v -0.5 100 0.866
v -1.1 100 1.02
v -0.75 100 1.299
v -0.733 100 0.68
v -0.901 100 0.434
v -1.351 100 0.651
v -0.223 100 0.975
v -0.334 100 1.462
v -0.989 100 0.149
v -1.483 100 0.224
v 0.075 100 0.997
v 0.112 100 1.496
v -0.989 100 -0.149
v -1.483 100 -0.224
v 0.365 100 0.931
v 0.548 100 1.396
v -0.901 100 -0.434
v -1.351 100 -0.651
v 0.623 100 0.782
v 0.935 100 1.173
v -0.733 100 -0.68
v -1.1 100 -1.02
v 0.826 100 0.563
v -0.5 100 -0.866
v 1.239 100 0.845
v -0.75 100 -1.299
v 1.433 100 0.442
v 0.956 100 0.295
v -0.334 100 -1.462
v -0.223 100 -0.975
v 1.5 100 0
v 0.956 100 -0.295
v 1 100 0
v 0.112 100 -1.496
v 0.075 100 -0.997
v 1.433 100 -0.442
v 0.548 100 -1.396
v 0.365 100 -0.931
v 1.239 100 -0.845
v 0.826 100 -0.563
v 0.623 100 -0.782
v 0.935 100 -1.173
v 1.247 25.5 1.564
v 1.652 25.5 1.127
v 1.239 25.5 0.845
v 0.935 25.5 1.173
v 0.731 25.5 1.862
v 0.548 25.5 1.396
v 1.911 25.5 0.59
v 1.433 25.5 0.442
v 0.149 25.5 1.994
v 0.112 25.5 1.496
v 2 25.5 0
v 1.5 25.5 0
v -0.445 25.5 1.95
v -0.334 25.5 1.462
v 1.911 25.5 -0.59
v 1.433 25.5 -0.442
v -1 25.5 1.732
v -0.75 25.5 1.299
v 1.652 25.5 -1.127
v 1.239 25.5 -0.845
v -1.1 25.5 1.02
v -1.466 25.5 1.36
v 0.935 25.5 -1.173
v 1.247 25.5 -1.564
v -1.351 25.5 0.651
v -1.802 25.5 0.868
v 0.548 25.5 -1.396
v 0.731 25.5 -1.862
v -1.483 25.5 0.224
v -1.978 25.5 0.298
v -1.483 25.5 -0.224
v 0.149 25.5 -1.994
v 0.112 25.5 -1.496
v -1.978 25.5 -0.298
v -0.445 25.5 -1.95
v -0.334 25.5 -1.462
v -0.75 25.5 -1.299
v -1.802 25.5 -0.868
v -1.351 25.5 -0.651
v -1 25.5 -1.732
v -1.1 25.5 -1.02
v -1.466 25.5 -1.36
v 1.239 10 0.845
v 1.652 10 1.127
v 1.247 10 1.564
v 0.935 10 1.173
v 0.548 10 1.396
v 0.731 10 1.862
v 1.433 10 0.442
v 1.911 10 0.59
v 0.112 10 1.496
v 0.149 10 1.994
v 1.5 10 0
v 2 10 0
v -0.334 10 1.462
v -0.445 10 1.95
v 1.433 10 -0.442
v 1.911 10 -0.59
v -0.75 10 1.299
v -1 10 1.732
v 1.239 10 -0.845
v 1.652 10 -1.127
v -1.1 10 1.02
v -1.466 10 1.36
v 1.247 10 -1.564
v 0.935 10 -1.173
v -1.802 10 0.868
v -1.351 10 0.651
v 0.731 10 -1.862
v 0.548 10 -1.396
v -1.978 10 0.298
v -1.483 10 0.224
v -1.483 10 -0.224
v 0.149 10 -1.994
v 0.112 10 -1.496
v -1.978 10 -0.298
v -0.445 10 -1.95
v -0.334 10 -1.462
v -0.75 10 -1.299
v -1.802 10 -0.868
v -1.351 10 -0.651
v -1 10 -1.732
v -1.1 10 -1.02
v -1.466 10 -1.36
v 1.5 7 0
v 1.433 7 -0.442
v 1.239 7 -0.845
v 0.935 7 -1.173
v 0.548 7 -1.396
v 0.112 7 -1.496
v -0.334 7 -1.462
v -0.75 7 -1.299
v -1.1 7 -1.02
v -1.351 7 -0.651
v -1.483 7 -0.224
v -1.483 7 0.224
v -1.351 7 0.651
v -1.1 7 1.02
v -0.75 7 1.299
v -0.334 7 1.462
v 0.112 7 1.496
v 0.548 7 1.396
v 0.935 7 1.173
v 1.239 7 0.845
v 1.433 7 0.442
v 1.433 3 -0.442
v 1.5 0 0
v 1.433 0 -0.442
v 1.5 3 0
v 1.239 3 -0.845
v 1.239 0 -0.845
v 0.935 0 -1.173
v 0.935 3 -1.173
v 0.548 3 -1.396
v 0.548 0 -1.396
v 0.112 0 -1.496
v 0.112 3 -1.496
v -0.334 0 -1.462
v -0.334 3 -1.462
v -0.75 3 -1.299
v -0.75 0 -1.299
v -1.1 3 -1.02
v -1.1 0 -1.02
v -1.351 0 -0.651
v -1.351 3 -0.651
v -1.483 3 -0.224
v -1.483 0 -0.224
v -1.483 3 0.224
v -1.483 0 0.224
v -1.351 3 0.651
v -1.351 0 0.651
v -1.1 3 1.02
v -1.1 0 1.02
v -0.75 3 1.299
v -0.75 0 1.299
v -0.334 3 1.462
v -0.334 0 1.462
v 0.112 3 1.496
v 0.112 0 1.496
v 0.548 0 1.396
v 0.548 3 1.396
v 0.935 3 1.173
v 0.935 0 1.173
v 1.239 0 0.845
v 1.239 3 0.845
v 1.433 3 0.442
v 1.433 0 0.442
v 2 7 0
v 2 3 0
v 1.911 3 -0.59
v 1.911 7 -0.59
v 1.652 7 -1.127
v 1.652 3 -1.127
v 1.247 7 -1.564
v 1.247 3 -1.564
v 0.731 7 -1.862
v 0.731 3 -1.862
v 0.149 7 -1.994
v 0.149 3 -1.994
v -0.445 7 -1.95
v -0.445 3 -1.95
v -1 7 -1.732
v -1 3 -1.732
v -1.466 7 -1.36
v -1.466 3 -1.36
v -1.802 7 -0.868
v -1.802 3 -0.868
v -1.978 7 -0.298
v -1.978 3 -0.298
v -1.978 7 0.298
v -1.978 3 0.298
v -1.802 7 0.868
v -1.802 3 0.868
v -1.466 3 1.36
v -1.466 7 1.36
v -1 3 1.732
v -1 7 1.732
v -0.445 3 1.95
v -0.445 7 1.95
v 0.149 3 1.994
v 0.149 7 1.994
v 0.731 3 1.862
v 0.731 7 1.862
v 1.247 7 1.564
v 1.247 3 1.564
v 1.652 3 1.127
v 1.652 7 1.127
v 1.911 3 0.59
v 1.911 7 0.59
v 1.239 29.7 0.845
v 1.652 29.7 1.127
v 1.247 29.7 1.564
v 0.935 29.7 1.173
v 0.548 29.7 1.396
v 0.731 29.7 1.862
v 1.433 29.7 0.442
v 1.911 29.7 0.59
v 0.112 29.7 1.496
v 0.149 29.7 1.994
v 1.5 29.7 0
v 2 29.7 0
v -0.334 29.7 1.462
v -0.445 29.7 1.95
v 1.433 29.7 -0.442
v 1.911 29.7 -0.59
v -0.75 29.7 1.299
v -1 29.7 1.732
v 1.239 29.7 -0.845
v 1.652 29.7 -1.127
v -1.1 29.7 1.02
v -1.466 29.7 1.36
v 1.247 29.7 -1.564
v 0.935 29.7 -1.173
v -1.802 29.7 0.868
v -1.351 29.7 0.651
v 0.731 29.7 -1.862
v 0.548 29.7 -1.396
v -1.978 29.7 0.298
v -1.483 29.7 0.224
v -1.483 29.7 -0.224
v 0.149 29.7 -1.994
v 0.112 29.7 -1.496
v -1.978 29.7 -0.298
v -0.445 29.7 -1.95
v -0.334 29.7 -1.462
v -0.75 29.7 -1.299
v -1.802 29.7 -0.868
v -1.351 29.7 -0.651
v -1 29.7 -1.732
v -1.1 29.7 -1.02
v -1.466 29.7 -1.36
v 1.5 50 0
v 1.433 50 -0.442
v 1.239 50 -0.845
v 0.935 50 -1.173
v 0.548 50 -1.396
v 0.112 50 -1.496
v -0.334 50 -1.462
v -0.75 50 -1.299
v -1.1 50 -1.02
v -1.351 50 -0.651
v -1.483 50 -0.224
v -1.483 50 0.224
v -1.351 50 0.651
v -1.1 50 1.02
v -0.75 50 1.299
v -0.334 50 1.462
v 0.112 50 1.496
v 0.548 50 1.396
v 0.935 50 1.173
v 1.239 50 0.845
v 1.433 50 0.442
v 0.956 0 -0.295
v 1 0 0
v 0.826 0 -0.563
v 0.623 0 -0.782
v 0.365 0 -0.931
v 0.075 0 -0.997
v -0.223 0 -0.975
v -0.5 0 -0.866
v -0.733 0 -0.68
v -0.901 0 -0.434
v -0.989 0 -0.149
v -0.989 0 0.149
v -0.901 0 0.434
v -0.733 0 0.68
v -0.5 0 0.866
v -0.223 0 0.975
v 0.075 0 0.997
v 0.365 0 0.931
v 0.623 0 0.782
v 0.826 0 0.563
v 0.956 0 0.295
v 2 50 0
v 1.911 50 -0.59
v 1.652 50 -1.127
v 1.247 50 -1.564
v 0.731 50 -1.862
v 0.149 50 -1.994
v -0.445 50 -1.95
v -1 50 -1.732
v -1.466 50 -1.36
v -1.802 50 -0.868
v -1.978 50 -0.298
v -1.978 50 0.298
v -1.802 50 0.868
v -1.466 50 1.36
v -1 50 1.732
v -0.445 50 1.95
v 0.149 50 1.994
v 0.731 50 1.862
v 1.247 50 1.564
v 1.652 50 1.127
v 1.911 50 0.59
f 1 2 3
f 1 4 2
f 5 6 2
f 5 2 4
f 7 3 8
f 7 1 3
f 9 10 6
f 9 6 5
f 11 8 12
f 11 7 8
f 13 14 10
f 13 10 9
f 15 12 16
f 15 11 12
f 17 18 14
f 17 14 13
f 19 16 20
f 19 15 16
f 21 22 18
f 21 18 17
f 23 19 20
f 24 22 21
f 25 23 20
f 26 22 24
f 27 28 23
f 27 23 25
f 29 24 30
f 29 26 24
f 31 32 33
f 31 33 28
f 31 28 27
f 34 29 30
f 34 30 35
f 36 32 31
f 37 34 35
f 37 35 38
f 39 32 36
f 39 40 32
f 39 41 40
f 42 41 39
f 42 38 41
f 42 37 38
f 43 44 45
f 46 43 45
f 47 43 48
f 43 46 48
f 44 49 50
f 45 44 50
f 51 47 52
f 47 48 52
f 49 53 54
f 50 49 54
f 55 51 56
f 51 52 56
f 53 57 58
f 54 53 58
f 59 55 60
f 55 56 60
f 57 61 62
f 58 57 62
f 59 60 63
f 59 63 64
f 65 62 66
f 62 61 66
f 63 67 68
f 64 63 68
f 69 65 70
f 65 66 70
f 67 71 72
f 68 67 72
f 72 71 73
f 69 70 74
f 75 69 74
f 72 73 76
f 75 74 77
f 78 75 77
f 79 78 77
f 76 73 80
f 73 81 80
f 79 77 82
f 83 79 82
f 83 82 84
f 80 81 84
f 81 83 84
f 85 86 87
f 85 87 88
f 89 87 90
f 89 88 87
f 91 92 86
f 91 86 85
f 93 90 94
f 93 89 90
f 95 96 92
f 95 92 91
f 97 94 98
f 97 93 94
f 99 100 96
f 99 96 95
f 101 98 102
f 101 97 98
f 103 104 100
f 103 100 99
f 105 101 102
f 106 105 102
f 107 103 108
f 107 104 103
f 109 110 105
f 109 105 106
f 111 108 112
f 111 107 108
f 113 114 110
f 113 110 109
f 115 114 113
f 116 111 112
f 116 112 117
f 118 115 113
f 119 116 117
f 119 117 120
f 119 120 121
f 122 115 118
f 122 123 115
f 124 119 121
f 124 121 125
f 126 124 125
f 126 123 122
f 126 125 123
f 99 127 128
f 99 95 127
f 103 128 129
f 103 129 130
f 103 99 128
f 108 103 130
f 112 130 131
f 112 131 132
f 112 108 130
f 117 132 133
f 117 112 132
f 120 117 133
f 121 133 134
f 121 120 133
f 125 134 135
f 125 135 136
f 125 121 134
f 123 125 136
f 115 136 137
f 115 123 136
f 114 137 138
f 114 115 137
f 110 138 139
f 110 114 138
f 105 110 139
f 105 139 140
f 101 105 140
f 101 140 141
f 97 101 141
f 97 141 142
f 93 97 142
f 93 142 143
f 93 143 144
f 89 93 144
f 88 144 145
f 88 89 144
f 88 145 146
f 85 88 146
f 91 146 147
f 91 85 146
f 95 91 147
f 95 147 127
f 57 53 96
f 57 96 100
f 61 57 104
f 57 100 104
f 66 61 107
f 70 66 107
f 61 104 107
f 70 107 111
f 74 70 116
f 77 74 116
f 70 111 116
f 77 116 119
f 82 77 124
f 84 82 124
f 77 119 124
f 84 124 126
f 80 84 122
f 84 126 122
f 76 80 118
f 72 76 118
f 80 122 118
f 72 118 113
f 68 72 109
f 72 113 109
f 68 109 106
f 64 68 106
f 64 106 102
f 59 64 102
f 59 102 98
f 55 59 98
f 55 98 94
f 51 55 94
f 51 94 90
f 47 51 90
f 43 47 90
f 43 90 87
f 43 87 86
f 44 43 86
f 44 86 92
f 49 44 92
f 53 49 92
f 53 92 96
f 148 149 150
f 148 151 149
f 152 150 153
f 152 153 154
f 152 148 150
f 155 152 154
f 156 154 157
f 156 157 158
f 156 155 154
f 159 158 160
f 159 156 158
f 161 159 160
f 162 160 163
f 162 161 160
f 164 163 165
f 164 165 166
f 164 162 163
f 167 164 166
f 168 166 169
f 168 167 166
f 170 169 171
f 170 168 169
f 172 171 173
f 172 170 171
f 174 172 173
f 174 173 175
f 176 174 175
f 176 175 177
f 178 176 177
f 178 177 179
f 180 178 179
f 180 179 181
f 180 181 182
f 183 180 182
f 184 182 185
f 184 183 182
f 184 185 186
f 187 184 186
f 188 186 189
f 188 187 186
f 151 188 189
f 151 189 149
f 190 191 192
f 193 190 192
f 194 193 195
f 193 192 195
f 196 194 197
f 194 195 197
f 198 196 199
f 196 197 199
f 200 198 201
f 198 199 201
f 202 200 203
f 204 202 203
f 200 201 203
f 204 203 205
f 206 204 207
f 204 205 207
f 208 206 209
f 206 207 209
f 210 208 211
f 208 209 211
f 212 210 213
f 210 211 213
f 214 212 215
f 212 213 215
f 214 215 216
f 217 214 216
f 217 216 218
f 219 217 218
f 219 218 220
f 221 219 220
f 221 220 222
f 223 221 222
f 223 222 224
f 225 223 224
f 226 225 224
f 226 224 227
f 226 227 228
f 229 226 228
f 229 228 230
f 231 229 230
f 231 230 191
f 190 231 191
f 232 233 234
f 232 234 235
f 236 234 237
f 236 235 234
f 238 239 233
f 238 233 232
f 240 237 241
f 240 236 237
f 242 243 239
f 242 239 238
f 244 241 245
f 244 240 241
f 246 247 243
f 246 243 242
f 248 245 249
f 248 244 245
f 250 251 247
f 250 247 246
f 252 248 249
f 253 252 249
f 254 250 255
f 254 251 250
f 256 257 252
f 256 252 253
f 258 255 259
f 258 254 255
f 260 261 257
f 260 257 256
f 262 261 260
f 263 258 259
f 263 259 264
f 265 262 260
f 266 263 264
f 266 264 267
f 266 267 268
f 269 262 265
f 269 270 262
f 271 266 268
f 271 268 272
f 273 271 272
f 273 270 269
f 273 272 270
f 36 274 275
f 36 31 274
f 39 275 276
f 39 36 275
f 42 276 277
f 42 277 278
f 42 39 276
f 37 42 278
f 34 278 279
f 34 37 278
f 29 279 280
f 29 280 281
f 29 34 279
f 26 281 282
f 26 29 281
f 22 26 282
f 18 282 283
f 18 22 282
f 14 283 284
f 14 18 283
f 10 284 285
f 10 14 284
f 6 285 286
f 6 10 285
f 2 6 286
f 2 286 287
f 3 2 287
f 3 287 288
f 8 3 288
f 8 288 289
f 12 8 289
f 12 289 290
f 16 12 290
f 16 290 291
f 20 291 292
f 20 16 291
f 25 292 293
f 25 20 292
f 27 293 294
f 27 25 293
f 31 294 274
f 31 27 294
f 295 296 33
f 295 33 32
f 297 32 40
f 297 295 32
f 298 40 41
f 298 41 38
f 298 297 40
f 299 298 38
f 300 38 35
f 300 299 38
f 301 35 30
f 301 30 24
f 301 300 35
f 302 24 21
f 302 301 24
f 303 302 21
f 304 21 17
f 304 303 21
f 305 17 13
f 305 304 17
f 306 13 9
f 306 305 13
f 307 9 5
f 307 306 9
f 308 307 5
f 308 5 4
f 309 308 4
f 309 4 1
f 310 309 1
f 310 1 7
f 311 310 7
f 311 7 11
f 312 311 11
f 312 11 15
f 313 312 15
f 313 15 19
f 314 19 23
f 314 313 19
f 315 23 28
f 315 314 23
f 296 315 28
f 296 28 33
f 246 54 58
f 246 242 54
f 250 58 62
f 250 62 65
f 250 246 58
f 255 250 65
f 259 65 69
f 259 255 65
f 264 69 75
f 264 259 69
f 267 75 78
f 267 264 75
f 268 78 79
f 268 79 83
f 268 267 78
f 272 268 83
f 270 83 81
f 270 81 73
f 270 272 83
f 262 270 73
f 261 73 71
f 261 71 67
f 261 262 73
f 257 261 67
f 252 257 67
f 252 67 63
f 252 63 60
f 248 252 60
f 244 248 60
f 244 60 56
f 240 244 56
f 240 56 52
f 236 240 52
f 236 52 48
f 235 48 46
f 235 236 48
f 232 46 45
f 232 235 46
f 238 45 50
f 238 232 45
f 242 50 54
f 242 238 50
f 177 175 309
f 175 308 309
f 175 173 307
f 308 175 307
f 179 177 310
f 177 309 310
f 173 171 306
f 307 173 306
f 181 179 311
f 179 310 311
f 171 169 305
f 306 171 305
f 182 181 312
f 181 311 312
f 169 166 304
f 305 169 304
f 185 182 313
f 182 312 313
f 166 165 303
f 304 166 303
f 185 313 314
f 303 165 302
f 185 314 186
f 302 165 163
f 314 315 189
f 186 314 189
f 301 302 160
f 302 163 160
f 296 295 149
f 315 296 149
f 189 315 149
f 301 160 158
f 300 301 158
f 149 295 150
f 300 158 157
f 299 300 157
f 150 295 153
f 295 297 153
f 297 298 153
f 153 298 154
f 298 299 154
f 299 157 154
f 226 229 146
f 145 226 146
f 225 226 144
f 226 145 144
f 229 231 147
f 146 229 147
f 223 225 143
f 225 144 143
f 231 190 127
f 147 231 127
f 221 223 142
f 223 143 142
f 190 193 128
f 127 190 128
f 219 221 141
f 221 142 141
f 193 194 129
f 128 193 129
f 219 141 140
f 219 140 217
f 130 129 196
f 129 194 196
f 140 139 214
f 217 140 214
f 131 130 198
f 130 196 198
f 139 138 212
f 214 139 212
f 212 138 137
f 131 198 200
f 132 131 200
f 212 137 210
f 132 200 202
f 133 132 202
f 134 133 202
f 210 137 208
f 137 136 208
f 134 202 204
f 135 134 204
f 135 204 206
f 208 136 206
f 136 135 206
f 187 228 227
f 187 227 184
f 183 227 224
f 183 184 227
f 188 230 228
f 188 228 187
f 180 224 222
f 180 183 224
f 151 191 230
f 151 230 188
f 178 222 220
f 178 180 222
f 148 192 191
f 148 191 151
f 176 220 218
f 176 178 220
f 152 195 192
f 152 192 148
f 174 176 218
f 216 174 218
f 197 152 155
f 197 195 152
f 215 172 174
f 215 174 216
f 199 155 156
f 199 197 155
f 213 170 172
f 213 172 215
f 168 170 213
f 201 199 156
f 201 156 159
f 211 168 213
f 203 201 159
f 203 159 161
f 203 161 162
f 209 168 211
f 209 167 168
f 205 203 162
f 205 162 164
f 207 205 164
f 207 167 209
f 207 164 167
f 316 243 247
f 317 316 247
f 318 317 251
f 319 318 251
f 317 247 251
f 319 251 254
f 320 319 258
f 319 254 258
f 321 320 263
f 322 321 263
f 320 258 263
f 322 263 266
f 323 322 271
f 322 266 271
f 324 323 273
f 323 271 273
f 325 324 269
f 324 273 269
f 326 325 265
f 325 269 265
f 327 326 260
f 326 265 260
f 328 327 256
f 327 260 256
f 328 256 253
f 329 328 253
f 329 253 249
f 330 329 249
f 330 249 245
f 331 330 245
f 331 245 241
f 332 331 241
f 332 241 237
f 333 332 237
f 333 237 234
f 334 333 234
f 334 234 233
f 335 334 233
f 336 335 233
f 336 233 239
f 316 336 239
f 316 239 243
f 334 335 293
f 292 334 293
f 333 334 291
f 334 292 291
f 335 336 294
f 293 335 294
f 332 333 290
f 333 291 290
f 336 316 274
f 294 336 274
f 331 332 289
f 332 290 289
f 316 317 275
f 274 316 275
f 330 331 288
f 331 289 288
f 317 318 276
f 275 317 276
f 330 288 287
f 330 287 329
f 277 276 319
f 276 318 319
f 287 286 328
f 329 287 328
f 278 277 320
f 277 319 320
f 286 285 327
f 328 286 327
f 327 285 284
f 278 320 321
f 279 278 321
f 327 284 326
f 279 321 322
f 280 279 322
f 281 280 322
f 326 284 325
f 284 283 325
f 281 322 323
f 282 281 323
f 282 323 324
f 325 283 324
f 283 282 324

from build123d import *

# Parameters (mm, degrees)
SKETCH_1_R      = 2
SKETCH_1_R_2    = 1
EXTRUDE_1_DEPTH = 100
SKETCH_2_W      = 0.5
SKETCH_2_H      = 3
SKETCH_4_W      = 0.5
SKETCH_4_H      = 50
SKETCH_5_W      = 0.5
SKETCH_5_H      = 4.2


with BuildPart() as part:
    # Эскиз1 → Бобышка-Вытянуть1 (new body)
    with BuildSketch(Plane(origin=(0, 0, 0), x_dir=(1, 0, 0), z_dir=(0, 1, 0))):
        Circle(SKETCH_1_R)
        Circle(SKETCH_1_R_2, mode=Mode.SUBTRACT)
    extrude(amount=EXTRUDE_1_DEPTH)

    # Эскиз2 → Вырез-Повернуть1 (revolve, cut)
    with BuildSketch(Plane.XY):
        with Locations((1.75, 1.5)):
            Rectangle(SKETCH_2_W, SKETCH_2_H)
        with Locations((1.75, 8.5)):
            Rectangle(SKETCH_2_W, SKETCH_2_H)
    revolve(axis=Axis((0, 0, 0), (0, 1, 0)), mode=Mode.SUBTRACT)

    # Эскиз4 → Вырез-Повернуть2 (revolve, cut)
    with BuildSketch(Plane.XY):
        with Locations((1.75, 75)):
            Rectangle(SKETCH_4_W, SKETCH_4_H)
    revolve(axis=Axis((0, 0, 0), (0, 1, 0)), mode=Mode.SUBTRACT)

    # Эскиз5 → Вырез-Повернуть3 (revolve, cut)
    with BuildSketch(Plane.XY):
        with Locations((1.75, 27.6)):
            Rectangle(SKETCH_5_W, SKETCH_5_H)
    revolve(axis=Axis((0, 0, 0), (0, 1, 0)), mode=Mode.SUBTRACT)


solid = part.part
